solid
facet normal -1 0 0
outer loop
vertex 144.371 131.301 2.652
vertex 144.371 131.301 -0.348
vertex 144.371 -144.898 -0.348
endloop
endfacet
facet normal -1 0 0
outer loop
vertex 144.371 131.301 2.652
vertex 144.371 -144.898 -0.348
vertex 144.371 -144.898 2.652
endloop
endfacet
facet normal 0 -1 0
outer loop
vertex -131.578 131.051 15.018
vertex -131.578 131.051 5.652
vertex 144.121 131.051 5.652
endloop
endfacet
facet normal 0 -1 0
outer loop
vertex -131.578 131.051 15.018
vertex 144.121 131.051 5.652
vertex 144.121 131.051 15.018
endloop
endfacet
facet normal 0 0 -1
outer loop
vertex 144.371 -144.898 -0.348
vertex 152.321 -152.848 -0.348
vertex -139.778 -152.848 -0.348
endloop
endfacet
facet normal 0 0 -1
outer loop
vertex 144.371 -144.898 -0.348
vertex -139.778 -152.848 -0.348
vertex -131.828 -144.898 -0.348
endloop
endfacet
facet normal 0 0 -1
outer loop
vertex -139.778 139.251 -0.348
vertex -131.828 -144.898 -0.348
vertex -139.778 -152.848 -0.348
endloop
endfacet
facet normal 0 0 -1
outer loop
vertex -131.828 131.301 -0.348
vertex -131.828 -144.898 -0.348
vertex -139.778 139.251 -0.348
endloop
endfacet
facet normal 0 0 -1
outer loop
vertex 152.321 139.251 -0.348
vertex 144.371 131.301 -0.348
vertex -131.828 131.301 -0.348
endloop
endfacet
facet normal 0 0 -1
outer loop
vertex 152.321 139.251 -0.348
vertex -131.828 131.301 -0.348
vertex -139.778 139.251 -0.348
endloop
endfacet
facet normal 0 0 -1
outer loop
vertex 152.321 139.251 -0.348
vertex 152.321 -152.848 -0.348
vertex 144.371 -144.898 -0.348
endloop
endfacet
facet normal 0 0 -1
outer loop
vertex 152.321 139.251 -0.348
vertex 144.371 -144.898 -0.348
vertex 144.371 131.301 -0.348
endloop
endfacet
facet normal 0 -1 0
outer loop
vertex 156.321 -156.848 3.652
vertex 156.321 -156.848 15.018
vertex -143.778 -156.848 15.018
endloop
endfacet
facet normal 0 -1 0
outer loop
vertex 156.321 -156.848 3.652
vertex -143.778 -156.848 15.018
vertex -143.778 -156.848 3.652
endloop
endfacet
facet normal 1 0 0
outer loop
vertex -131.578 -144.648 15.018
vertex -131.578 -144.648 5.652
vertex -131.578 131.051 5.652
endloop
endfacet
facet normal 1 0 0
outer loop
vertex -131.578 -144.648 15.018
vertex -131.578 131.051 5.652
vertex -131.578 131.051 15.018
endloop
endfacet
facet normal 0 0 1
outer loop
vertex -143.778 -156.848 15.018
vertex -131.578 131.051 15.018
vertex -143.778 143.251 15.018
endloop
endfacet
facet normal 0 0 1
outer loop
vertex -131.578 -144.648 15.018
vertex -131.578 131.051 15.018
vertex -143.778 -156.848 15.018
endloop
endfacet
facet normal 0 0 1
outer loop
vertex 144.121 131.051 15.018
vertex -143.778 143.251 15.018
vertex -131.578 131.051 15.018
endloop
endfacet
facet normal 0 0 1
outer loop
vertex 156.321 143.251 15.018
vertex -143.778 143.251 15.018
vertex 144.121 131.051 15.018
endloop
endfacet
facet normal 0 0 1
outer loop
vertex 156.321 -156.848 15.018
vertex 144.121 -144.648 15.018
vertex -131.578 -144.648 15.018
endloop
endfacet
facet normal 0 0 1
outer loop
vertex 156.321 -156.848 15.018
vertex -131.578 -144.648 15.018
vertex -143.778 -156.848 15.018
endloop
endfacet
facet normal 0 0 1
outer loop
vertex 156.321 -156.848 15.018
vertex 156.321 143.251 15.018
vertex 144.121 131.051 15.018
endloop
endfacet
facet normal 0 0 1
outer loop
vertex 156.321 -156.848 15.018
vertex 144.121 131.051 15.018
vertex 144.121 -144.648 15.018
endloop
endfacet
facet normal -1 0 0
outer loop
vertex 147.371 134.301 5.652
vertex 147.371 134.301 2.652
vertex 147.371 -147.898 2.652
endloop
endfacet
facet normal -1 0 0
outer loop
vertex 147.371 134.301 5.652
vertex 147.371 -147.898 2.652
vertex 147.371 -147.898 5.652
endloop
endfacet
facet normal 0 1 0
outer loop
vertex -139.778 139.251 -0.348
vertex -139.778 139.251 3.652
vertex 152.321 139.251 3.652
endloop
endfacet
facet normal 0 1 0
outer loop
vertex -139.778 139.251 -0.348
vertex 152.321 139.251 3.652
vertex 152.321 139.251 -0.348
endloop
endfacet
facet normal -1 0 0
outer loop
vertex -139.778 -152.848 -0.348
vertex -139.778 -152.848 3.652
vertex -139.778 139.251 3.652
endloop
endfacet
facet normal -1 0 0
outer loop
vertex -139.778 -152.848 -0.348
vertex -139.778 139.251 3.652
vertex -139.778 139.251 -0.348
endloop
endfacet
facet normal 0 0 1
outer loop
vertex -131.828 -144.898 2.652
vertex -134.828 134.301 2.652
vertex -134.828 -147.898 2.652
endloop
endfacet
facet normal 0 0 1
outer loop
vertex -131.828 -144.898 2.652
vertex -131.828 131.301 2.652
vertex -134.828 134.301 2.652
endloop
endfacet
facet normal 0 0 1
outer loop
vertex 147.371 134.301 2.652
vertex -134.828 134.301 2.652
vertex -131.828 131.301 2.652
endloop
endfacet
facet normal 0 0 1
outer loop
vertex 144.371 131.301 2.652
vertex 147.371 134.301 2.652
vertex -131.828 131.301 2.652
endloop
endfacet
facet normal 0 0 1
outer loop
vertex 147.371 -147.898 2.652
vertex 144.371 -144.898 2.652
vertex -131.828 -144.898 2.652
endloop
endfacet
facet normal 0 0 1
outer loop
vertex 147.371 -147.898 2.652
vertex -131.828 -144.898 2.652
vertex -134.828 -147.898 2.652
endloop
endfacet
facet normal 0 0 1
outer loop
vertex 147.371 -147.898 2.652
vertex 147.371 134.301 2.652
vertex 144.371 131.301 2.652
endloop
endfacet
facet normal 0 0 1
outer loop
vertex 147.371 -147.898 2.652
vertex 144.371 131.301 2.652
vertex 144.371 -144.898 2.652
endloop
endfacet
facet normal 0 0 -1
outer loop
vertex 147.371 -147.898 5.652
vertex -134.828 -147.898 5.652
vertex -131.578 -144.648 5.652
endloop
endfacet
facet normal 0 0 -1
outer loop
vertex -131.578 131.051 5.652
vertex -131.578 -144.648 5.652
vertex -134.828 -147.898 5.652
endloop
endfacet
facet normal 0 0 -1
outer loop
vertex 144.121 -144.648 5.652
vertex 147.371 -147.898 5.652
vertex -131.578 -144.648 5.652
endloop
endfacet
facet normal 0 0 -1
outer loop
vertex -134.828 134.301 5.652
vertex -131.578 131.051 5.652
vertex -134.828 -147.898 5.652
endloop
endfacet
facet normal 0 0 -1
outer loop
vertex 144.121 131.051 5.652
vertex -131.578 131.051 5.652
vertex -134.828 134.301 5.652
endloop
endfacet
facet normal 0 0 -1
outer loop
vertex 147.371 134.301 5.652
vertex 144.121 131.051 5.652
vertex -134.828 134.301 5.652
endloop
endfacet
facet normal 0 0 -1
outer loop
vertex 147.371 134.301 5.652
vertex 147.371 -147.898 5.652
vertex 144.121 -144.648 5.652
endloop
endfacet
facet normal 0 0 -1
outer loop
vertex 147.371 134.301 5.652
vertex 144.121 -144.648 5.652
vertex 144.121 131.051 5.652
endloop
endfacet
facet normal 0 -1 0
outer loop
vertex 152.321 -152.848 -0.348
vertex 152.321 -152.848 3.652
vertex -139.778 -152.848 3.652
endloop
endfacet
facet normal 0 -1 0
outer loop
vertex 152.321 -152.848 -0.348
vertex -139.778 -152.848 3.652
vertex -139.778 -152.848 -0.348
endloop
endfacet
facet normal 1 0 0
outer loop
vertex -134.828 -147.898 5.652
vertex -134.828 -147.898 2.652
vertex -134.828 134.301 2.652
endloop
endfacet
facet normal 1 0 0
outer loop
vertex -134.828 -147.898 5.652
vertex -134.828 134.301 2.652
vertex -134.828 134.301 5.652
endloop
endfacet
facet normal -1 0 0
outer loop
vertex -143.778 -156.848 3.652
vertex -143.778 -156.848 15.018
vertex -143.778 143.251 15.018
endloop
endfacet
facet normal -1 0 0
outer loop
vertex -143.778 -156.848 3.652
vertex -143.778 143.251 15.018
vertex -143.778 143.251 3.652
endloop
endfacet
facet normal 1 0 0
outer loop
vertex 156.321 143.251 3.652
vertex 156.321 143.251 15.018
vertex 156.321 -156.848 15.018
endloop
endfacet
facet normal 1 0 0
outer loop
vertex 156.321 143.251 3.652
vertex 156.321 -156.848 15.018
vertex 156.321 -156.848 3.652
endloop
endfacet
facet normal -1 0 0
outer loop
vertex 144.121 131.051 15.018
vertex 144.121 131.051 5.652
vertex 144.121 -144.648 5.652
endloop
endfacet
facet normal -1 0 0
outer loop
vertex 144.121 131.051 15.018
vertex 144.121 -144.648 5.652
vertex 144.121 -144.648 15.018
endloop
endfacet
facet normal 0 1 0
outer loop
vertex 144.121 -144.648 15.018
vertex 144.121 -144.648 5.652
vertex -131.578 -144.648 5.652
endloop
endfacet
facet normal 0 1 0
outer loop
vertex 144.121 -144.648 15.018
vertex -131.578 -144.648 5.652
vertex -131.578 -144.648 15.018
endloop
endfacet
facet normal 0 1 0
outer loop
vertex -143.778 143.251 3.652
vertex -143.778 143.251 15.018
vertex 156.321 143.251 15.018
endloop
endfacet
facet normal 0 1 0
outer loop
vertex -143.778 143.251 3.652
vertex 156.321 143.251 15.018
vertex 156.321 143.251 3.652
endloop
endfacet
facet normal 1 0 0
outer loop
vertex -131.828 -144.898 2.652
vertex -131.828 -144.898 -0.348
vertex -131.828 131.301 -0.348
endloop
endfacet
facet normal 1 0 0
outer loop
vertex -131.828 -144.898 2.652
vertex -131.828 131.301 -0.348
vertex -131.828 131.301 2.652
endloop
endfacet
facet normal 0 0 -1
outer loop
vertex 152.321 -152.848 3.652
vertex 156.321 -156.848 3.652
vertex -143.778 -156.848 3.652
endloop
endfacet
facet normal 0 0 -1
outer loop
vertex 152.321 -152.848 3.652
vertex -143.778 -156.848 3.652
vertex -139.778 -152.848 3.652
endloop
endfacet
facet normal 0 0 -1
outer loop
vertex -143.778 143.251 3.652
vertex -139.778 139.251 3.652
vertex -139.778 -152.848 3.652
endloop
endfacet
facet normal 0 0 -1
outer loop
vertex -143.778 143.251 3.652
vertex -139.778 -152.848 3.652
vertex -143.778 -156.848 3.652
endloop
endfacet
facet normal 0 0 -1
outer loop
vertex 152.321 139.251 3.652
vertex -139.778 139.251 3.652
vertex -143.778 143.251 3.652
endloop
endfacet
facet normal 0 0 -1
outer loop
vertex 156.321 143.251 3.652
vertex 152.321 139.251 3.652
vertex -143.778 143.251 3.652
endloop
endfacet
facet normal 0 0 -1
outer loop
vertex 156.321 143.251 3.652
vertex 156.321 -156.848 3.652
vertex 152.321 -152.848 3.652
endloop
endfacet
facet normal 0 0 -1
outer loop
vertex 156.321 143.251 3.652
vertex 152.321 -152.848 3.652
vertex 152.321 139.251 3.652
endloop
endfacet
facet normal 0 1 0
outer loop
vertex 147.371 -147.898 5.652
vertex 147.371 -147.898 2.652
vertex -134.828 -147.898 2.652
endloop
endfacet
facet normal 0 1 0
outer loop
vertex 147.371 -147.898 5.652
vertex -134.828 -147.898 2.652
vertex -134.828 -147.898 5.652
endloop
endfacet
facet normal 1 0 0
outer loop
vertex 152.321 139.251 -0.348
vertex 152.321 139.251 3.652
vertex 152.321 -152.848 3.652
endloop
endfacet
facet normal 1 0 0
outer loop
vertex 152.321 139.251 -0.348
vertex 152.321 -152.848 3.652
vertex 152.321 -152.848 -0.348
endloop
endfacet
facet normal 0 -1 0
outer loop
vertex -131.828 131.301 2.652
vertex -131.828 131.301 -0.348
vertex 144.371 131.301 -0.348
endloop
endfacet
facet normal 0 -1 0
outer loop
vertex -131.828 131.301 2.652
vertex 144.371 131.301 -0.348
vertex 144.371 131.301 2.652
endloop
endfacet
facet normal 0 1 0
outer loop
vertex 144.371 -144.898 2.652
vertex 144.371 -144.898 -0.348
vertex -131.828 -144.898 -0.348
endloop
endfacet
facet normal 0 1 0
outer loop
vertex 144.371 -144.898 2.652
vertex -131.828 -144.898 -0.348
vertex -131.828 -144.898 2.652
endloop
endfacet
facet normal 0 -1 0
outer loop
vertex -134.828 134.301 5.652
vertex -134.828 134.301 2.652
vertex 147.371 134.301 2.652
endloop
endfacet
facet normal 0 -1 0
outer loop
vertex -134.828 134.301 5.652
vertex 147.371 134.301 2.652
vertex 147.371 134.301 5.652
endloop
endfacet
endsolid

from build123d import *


with BuildPart() as f2:
    # F2: sweep along a path in F0
    with BuildLine(Plane.XY) as f2_path:
        Line((-143.7282372266, -156.79862791), (156.2717627734, -156.79862791))
        Line((156.2717627734, -156.79862791), (156.2717627734, 143.20137209))
        Line((156.2717627734, 143.20137209), (-143.7282372266, 143.20137209))
        Line((-143.7282372266, 143.20137209), (-143.7282372266, -156.79862791))
    # F1 (on Right) → F2 (sweep)
    with BuildSketch(Plane.YZ):
        Polygon((-152.8481326103, -0.3476490092), (-144.8981165886, -0.3476490092), (-144.8981165886, 2.6523509908), (-147.8981165886, 2.6523509908), (-147.8981165886, 5.6523509908), (-144.6481214636, 5.6523509908), (-144.6481214636, 15.0182117835), (-156.8481326103, 15.0182117835), (-156.8481326103, 3.6523509908), (-152.8481326103, 3.6523509908), align=None)
    sweep(path=f2_path.line, transition=Transition.RIGHT)


solid = f2.part
